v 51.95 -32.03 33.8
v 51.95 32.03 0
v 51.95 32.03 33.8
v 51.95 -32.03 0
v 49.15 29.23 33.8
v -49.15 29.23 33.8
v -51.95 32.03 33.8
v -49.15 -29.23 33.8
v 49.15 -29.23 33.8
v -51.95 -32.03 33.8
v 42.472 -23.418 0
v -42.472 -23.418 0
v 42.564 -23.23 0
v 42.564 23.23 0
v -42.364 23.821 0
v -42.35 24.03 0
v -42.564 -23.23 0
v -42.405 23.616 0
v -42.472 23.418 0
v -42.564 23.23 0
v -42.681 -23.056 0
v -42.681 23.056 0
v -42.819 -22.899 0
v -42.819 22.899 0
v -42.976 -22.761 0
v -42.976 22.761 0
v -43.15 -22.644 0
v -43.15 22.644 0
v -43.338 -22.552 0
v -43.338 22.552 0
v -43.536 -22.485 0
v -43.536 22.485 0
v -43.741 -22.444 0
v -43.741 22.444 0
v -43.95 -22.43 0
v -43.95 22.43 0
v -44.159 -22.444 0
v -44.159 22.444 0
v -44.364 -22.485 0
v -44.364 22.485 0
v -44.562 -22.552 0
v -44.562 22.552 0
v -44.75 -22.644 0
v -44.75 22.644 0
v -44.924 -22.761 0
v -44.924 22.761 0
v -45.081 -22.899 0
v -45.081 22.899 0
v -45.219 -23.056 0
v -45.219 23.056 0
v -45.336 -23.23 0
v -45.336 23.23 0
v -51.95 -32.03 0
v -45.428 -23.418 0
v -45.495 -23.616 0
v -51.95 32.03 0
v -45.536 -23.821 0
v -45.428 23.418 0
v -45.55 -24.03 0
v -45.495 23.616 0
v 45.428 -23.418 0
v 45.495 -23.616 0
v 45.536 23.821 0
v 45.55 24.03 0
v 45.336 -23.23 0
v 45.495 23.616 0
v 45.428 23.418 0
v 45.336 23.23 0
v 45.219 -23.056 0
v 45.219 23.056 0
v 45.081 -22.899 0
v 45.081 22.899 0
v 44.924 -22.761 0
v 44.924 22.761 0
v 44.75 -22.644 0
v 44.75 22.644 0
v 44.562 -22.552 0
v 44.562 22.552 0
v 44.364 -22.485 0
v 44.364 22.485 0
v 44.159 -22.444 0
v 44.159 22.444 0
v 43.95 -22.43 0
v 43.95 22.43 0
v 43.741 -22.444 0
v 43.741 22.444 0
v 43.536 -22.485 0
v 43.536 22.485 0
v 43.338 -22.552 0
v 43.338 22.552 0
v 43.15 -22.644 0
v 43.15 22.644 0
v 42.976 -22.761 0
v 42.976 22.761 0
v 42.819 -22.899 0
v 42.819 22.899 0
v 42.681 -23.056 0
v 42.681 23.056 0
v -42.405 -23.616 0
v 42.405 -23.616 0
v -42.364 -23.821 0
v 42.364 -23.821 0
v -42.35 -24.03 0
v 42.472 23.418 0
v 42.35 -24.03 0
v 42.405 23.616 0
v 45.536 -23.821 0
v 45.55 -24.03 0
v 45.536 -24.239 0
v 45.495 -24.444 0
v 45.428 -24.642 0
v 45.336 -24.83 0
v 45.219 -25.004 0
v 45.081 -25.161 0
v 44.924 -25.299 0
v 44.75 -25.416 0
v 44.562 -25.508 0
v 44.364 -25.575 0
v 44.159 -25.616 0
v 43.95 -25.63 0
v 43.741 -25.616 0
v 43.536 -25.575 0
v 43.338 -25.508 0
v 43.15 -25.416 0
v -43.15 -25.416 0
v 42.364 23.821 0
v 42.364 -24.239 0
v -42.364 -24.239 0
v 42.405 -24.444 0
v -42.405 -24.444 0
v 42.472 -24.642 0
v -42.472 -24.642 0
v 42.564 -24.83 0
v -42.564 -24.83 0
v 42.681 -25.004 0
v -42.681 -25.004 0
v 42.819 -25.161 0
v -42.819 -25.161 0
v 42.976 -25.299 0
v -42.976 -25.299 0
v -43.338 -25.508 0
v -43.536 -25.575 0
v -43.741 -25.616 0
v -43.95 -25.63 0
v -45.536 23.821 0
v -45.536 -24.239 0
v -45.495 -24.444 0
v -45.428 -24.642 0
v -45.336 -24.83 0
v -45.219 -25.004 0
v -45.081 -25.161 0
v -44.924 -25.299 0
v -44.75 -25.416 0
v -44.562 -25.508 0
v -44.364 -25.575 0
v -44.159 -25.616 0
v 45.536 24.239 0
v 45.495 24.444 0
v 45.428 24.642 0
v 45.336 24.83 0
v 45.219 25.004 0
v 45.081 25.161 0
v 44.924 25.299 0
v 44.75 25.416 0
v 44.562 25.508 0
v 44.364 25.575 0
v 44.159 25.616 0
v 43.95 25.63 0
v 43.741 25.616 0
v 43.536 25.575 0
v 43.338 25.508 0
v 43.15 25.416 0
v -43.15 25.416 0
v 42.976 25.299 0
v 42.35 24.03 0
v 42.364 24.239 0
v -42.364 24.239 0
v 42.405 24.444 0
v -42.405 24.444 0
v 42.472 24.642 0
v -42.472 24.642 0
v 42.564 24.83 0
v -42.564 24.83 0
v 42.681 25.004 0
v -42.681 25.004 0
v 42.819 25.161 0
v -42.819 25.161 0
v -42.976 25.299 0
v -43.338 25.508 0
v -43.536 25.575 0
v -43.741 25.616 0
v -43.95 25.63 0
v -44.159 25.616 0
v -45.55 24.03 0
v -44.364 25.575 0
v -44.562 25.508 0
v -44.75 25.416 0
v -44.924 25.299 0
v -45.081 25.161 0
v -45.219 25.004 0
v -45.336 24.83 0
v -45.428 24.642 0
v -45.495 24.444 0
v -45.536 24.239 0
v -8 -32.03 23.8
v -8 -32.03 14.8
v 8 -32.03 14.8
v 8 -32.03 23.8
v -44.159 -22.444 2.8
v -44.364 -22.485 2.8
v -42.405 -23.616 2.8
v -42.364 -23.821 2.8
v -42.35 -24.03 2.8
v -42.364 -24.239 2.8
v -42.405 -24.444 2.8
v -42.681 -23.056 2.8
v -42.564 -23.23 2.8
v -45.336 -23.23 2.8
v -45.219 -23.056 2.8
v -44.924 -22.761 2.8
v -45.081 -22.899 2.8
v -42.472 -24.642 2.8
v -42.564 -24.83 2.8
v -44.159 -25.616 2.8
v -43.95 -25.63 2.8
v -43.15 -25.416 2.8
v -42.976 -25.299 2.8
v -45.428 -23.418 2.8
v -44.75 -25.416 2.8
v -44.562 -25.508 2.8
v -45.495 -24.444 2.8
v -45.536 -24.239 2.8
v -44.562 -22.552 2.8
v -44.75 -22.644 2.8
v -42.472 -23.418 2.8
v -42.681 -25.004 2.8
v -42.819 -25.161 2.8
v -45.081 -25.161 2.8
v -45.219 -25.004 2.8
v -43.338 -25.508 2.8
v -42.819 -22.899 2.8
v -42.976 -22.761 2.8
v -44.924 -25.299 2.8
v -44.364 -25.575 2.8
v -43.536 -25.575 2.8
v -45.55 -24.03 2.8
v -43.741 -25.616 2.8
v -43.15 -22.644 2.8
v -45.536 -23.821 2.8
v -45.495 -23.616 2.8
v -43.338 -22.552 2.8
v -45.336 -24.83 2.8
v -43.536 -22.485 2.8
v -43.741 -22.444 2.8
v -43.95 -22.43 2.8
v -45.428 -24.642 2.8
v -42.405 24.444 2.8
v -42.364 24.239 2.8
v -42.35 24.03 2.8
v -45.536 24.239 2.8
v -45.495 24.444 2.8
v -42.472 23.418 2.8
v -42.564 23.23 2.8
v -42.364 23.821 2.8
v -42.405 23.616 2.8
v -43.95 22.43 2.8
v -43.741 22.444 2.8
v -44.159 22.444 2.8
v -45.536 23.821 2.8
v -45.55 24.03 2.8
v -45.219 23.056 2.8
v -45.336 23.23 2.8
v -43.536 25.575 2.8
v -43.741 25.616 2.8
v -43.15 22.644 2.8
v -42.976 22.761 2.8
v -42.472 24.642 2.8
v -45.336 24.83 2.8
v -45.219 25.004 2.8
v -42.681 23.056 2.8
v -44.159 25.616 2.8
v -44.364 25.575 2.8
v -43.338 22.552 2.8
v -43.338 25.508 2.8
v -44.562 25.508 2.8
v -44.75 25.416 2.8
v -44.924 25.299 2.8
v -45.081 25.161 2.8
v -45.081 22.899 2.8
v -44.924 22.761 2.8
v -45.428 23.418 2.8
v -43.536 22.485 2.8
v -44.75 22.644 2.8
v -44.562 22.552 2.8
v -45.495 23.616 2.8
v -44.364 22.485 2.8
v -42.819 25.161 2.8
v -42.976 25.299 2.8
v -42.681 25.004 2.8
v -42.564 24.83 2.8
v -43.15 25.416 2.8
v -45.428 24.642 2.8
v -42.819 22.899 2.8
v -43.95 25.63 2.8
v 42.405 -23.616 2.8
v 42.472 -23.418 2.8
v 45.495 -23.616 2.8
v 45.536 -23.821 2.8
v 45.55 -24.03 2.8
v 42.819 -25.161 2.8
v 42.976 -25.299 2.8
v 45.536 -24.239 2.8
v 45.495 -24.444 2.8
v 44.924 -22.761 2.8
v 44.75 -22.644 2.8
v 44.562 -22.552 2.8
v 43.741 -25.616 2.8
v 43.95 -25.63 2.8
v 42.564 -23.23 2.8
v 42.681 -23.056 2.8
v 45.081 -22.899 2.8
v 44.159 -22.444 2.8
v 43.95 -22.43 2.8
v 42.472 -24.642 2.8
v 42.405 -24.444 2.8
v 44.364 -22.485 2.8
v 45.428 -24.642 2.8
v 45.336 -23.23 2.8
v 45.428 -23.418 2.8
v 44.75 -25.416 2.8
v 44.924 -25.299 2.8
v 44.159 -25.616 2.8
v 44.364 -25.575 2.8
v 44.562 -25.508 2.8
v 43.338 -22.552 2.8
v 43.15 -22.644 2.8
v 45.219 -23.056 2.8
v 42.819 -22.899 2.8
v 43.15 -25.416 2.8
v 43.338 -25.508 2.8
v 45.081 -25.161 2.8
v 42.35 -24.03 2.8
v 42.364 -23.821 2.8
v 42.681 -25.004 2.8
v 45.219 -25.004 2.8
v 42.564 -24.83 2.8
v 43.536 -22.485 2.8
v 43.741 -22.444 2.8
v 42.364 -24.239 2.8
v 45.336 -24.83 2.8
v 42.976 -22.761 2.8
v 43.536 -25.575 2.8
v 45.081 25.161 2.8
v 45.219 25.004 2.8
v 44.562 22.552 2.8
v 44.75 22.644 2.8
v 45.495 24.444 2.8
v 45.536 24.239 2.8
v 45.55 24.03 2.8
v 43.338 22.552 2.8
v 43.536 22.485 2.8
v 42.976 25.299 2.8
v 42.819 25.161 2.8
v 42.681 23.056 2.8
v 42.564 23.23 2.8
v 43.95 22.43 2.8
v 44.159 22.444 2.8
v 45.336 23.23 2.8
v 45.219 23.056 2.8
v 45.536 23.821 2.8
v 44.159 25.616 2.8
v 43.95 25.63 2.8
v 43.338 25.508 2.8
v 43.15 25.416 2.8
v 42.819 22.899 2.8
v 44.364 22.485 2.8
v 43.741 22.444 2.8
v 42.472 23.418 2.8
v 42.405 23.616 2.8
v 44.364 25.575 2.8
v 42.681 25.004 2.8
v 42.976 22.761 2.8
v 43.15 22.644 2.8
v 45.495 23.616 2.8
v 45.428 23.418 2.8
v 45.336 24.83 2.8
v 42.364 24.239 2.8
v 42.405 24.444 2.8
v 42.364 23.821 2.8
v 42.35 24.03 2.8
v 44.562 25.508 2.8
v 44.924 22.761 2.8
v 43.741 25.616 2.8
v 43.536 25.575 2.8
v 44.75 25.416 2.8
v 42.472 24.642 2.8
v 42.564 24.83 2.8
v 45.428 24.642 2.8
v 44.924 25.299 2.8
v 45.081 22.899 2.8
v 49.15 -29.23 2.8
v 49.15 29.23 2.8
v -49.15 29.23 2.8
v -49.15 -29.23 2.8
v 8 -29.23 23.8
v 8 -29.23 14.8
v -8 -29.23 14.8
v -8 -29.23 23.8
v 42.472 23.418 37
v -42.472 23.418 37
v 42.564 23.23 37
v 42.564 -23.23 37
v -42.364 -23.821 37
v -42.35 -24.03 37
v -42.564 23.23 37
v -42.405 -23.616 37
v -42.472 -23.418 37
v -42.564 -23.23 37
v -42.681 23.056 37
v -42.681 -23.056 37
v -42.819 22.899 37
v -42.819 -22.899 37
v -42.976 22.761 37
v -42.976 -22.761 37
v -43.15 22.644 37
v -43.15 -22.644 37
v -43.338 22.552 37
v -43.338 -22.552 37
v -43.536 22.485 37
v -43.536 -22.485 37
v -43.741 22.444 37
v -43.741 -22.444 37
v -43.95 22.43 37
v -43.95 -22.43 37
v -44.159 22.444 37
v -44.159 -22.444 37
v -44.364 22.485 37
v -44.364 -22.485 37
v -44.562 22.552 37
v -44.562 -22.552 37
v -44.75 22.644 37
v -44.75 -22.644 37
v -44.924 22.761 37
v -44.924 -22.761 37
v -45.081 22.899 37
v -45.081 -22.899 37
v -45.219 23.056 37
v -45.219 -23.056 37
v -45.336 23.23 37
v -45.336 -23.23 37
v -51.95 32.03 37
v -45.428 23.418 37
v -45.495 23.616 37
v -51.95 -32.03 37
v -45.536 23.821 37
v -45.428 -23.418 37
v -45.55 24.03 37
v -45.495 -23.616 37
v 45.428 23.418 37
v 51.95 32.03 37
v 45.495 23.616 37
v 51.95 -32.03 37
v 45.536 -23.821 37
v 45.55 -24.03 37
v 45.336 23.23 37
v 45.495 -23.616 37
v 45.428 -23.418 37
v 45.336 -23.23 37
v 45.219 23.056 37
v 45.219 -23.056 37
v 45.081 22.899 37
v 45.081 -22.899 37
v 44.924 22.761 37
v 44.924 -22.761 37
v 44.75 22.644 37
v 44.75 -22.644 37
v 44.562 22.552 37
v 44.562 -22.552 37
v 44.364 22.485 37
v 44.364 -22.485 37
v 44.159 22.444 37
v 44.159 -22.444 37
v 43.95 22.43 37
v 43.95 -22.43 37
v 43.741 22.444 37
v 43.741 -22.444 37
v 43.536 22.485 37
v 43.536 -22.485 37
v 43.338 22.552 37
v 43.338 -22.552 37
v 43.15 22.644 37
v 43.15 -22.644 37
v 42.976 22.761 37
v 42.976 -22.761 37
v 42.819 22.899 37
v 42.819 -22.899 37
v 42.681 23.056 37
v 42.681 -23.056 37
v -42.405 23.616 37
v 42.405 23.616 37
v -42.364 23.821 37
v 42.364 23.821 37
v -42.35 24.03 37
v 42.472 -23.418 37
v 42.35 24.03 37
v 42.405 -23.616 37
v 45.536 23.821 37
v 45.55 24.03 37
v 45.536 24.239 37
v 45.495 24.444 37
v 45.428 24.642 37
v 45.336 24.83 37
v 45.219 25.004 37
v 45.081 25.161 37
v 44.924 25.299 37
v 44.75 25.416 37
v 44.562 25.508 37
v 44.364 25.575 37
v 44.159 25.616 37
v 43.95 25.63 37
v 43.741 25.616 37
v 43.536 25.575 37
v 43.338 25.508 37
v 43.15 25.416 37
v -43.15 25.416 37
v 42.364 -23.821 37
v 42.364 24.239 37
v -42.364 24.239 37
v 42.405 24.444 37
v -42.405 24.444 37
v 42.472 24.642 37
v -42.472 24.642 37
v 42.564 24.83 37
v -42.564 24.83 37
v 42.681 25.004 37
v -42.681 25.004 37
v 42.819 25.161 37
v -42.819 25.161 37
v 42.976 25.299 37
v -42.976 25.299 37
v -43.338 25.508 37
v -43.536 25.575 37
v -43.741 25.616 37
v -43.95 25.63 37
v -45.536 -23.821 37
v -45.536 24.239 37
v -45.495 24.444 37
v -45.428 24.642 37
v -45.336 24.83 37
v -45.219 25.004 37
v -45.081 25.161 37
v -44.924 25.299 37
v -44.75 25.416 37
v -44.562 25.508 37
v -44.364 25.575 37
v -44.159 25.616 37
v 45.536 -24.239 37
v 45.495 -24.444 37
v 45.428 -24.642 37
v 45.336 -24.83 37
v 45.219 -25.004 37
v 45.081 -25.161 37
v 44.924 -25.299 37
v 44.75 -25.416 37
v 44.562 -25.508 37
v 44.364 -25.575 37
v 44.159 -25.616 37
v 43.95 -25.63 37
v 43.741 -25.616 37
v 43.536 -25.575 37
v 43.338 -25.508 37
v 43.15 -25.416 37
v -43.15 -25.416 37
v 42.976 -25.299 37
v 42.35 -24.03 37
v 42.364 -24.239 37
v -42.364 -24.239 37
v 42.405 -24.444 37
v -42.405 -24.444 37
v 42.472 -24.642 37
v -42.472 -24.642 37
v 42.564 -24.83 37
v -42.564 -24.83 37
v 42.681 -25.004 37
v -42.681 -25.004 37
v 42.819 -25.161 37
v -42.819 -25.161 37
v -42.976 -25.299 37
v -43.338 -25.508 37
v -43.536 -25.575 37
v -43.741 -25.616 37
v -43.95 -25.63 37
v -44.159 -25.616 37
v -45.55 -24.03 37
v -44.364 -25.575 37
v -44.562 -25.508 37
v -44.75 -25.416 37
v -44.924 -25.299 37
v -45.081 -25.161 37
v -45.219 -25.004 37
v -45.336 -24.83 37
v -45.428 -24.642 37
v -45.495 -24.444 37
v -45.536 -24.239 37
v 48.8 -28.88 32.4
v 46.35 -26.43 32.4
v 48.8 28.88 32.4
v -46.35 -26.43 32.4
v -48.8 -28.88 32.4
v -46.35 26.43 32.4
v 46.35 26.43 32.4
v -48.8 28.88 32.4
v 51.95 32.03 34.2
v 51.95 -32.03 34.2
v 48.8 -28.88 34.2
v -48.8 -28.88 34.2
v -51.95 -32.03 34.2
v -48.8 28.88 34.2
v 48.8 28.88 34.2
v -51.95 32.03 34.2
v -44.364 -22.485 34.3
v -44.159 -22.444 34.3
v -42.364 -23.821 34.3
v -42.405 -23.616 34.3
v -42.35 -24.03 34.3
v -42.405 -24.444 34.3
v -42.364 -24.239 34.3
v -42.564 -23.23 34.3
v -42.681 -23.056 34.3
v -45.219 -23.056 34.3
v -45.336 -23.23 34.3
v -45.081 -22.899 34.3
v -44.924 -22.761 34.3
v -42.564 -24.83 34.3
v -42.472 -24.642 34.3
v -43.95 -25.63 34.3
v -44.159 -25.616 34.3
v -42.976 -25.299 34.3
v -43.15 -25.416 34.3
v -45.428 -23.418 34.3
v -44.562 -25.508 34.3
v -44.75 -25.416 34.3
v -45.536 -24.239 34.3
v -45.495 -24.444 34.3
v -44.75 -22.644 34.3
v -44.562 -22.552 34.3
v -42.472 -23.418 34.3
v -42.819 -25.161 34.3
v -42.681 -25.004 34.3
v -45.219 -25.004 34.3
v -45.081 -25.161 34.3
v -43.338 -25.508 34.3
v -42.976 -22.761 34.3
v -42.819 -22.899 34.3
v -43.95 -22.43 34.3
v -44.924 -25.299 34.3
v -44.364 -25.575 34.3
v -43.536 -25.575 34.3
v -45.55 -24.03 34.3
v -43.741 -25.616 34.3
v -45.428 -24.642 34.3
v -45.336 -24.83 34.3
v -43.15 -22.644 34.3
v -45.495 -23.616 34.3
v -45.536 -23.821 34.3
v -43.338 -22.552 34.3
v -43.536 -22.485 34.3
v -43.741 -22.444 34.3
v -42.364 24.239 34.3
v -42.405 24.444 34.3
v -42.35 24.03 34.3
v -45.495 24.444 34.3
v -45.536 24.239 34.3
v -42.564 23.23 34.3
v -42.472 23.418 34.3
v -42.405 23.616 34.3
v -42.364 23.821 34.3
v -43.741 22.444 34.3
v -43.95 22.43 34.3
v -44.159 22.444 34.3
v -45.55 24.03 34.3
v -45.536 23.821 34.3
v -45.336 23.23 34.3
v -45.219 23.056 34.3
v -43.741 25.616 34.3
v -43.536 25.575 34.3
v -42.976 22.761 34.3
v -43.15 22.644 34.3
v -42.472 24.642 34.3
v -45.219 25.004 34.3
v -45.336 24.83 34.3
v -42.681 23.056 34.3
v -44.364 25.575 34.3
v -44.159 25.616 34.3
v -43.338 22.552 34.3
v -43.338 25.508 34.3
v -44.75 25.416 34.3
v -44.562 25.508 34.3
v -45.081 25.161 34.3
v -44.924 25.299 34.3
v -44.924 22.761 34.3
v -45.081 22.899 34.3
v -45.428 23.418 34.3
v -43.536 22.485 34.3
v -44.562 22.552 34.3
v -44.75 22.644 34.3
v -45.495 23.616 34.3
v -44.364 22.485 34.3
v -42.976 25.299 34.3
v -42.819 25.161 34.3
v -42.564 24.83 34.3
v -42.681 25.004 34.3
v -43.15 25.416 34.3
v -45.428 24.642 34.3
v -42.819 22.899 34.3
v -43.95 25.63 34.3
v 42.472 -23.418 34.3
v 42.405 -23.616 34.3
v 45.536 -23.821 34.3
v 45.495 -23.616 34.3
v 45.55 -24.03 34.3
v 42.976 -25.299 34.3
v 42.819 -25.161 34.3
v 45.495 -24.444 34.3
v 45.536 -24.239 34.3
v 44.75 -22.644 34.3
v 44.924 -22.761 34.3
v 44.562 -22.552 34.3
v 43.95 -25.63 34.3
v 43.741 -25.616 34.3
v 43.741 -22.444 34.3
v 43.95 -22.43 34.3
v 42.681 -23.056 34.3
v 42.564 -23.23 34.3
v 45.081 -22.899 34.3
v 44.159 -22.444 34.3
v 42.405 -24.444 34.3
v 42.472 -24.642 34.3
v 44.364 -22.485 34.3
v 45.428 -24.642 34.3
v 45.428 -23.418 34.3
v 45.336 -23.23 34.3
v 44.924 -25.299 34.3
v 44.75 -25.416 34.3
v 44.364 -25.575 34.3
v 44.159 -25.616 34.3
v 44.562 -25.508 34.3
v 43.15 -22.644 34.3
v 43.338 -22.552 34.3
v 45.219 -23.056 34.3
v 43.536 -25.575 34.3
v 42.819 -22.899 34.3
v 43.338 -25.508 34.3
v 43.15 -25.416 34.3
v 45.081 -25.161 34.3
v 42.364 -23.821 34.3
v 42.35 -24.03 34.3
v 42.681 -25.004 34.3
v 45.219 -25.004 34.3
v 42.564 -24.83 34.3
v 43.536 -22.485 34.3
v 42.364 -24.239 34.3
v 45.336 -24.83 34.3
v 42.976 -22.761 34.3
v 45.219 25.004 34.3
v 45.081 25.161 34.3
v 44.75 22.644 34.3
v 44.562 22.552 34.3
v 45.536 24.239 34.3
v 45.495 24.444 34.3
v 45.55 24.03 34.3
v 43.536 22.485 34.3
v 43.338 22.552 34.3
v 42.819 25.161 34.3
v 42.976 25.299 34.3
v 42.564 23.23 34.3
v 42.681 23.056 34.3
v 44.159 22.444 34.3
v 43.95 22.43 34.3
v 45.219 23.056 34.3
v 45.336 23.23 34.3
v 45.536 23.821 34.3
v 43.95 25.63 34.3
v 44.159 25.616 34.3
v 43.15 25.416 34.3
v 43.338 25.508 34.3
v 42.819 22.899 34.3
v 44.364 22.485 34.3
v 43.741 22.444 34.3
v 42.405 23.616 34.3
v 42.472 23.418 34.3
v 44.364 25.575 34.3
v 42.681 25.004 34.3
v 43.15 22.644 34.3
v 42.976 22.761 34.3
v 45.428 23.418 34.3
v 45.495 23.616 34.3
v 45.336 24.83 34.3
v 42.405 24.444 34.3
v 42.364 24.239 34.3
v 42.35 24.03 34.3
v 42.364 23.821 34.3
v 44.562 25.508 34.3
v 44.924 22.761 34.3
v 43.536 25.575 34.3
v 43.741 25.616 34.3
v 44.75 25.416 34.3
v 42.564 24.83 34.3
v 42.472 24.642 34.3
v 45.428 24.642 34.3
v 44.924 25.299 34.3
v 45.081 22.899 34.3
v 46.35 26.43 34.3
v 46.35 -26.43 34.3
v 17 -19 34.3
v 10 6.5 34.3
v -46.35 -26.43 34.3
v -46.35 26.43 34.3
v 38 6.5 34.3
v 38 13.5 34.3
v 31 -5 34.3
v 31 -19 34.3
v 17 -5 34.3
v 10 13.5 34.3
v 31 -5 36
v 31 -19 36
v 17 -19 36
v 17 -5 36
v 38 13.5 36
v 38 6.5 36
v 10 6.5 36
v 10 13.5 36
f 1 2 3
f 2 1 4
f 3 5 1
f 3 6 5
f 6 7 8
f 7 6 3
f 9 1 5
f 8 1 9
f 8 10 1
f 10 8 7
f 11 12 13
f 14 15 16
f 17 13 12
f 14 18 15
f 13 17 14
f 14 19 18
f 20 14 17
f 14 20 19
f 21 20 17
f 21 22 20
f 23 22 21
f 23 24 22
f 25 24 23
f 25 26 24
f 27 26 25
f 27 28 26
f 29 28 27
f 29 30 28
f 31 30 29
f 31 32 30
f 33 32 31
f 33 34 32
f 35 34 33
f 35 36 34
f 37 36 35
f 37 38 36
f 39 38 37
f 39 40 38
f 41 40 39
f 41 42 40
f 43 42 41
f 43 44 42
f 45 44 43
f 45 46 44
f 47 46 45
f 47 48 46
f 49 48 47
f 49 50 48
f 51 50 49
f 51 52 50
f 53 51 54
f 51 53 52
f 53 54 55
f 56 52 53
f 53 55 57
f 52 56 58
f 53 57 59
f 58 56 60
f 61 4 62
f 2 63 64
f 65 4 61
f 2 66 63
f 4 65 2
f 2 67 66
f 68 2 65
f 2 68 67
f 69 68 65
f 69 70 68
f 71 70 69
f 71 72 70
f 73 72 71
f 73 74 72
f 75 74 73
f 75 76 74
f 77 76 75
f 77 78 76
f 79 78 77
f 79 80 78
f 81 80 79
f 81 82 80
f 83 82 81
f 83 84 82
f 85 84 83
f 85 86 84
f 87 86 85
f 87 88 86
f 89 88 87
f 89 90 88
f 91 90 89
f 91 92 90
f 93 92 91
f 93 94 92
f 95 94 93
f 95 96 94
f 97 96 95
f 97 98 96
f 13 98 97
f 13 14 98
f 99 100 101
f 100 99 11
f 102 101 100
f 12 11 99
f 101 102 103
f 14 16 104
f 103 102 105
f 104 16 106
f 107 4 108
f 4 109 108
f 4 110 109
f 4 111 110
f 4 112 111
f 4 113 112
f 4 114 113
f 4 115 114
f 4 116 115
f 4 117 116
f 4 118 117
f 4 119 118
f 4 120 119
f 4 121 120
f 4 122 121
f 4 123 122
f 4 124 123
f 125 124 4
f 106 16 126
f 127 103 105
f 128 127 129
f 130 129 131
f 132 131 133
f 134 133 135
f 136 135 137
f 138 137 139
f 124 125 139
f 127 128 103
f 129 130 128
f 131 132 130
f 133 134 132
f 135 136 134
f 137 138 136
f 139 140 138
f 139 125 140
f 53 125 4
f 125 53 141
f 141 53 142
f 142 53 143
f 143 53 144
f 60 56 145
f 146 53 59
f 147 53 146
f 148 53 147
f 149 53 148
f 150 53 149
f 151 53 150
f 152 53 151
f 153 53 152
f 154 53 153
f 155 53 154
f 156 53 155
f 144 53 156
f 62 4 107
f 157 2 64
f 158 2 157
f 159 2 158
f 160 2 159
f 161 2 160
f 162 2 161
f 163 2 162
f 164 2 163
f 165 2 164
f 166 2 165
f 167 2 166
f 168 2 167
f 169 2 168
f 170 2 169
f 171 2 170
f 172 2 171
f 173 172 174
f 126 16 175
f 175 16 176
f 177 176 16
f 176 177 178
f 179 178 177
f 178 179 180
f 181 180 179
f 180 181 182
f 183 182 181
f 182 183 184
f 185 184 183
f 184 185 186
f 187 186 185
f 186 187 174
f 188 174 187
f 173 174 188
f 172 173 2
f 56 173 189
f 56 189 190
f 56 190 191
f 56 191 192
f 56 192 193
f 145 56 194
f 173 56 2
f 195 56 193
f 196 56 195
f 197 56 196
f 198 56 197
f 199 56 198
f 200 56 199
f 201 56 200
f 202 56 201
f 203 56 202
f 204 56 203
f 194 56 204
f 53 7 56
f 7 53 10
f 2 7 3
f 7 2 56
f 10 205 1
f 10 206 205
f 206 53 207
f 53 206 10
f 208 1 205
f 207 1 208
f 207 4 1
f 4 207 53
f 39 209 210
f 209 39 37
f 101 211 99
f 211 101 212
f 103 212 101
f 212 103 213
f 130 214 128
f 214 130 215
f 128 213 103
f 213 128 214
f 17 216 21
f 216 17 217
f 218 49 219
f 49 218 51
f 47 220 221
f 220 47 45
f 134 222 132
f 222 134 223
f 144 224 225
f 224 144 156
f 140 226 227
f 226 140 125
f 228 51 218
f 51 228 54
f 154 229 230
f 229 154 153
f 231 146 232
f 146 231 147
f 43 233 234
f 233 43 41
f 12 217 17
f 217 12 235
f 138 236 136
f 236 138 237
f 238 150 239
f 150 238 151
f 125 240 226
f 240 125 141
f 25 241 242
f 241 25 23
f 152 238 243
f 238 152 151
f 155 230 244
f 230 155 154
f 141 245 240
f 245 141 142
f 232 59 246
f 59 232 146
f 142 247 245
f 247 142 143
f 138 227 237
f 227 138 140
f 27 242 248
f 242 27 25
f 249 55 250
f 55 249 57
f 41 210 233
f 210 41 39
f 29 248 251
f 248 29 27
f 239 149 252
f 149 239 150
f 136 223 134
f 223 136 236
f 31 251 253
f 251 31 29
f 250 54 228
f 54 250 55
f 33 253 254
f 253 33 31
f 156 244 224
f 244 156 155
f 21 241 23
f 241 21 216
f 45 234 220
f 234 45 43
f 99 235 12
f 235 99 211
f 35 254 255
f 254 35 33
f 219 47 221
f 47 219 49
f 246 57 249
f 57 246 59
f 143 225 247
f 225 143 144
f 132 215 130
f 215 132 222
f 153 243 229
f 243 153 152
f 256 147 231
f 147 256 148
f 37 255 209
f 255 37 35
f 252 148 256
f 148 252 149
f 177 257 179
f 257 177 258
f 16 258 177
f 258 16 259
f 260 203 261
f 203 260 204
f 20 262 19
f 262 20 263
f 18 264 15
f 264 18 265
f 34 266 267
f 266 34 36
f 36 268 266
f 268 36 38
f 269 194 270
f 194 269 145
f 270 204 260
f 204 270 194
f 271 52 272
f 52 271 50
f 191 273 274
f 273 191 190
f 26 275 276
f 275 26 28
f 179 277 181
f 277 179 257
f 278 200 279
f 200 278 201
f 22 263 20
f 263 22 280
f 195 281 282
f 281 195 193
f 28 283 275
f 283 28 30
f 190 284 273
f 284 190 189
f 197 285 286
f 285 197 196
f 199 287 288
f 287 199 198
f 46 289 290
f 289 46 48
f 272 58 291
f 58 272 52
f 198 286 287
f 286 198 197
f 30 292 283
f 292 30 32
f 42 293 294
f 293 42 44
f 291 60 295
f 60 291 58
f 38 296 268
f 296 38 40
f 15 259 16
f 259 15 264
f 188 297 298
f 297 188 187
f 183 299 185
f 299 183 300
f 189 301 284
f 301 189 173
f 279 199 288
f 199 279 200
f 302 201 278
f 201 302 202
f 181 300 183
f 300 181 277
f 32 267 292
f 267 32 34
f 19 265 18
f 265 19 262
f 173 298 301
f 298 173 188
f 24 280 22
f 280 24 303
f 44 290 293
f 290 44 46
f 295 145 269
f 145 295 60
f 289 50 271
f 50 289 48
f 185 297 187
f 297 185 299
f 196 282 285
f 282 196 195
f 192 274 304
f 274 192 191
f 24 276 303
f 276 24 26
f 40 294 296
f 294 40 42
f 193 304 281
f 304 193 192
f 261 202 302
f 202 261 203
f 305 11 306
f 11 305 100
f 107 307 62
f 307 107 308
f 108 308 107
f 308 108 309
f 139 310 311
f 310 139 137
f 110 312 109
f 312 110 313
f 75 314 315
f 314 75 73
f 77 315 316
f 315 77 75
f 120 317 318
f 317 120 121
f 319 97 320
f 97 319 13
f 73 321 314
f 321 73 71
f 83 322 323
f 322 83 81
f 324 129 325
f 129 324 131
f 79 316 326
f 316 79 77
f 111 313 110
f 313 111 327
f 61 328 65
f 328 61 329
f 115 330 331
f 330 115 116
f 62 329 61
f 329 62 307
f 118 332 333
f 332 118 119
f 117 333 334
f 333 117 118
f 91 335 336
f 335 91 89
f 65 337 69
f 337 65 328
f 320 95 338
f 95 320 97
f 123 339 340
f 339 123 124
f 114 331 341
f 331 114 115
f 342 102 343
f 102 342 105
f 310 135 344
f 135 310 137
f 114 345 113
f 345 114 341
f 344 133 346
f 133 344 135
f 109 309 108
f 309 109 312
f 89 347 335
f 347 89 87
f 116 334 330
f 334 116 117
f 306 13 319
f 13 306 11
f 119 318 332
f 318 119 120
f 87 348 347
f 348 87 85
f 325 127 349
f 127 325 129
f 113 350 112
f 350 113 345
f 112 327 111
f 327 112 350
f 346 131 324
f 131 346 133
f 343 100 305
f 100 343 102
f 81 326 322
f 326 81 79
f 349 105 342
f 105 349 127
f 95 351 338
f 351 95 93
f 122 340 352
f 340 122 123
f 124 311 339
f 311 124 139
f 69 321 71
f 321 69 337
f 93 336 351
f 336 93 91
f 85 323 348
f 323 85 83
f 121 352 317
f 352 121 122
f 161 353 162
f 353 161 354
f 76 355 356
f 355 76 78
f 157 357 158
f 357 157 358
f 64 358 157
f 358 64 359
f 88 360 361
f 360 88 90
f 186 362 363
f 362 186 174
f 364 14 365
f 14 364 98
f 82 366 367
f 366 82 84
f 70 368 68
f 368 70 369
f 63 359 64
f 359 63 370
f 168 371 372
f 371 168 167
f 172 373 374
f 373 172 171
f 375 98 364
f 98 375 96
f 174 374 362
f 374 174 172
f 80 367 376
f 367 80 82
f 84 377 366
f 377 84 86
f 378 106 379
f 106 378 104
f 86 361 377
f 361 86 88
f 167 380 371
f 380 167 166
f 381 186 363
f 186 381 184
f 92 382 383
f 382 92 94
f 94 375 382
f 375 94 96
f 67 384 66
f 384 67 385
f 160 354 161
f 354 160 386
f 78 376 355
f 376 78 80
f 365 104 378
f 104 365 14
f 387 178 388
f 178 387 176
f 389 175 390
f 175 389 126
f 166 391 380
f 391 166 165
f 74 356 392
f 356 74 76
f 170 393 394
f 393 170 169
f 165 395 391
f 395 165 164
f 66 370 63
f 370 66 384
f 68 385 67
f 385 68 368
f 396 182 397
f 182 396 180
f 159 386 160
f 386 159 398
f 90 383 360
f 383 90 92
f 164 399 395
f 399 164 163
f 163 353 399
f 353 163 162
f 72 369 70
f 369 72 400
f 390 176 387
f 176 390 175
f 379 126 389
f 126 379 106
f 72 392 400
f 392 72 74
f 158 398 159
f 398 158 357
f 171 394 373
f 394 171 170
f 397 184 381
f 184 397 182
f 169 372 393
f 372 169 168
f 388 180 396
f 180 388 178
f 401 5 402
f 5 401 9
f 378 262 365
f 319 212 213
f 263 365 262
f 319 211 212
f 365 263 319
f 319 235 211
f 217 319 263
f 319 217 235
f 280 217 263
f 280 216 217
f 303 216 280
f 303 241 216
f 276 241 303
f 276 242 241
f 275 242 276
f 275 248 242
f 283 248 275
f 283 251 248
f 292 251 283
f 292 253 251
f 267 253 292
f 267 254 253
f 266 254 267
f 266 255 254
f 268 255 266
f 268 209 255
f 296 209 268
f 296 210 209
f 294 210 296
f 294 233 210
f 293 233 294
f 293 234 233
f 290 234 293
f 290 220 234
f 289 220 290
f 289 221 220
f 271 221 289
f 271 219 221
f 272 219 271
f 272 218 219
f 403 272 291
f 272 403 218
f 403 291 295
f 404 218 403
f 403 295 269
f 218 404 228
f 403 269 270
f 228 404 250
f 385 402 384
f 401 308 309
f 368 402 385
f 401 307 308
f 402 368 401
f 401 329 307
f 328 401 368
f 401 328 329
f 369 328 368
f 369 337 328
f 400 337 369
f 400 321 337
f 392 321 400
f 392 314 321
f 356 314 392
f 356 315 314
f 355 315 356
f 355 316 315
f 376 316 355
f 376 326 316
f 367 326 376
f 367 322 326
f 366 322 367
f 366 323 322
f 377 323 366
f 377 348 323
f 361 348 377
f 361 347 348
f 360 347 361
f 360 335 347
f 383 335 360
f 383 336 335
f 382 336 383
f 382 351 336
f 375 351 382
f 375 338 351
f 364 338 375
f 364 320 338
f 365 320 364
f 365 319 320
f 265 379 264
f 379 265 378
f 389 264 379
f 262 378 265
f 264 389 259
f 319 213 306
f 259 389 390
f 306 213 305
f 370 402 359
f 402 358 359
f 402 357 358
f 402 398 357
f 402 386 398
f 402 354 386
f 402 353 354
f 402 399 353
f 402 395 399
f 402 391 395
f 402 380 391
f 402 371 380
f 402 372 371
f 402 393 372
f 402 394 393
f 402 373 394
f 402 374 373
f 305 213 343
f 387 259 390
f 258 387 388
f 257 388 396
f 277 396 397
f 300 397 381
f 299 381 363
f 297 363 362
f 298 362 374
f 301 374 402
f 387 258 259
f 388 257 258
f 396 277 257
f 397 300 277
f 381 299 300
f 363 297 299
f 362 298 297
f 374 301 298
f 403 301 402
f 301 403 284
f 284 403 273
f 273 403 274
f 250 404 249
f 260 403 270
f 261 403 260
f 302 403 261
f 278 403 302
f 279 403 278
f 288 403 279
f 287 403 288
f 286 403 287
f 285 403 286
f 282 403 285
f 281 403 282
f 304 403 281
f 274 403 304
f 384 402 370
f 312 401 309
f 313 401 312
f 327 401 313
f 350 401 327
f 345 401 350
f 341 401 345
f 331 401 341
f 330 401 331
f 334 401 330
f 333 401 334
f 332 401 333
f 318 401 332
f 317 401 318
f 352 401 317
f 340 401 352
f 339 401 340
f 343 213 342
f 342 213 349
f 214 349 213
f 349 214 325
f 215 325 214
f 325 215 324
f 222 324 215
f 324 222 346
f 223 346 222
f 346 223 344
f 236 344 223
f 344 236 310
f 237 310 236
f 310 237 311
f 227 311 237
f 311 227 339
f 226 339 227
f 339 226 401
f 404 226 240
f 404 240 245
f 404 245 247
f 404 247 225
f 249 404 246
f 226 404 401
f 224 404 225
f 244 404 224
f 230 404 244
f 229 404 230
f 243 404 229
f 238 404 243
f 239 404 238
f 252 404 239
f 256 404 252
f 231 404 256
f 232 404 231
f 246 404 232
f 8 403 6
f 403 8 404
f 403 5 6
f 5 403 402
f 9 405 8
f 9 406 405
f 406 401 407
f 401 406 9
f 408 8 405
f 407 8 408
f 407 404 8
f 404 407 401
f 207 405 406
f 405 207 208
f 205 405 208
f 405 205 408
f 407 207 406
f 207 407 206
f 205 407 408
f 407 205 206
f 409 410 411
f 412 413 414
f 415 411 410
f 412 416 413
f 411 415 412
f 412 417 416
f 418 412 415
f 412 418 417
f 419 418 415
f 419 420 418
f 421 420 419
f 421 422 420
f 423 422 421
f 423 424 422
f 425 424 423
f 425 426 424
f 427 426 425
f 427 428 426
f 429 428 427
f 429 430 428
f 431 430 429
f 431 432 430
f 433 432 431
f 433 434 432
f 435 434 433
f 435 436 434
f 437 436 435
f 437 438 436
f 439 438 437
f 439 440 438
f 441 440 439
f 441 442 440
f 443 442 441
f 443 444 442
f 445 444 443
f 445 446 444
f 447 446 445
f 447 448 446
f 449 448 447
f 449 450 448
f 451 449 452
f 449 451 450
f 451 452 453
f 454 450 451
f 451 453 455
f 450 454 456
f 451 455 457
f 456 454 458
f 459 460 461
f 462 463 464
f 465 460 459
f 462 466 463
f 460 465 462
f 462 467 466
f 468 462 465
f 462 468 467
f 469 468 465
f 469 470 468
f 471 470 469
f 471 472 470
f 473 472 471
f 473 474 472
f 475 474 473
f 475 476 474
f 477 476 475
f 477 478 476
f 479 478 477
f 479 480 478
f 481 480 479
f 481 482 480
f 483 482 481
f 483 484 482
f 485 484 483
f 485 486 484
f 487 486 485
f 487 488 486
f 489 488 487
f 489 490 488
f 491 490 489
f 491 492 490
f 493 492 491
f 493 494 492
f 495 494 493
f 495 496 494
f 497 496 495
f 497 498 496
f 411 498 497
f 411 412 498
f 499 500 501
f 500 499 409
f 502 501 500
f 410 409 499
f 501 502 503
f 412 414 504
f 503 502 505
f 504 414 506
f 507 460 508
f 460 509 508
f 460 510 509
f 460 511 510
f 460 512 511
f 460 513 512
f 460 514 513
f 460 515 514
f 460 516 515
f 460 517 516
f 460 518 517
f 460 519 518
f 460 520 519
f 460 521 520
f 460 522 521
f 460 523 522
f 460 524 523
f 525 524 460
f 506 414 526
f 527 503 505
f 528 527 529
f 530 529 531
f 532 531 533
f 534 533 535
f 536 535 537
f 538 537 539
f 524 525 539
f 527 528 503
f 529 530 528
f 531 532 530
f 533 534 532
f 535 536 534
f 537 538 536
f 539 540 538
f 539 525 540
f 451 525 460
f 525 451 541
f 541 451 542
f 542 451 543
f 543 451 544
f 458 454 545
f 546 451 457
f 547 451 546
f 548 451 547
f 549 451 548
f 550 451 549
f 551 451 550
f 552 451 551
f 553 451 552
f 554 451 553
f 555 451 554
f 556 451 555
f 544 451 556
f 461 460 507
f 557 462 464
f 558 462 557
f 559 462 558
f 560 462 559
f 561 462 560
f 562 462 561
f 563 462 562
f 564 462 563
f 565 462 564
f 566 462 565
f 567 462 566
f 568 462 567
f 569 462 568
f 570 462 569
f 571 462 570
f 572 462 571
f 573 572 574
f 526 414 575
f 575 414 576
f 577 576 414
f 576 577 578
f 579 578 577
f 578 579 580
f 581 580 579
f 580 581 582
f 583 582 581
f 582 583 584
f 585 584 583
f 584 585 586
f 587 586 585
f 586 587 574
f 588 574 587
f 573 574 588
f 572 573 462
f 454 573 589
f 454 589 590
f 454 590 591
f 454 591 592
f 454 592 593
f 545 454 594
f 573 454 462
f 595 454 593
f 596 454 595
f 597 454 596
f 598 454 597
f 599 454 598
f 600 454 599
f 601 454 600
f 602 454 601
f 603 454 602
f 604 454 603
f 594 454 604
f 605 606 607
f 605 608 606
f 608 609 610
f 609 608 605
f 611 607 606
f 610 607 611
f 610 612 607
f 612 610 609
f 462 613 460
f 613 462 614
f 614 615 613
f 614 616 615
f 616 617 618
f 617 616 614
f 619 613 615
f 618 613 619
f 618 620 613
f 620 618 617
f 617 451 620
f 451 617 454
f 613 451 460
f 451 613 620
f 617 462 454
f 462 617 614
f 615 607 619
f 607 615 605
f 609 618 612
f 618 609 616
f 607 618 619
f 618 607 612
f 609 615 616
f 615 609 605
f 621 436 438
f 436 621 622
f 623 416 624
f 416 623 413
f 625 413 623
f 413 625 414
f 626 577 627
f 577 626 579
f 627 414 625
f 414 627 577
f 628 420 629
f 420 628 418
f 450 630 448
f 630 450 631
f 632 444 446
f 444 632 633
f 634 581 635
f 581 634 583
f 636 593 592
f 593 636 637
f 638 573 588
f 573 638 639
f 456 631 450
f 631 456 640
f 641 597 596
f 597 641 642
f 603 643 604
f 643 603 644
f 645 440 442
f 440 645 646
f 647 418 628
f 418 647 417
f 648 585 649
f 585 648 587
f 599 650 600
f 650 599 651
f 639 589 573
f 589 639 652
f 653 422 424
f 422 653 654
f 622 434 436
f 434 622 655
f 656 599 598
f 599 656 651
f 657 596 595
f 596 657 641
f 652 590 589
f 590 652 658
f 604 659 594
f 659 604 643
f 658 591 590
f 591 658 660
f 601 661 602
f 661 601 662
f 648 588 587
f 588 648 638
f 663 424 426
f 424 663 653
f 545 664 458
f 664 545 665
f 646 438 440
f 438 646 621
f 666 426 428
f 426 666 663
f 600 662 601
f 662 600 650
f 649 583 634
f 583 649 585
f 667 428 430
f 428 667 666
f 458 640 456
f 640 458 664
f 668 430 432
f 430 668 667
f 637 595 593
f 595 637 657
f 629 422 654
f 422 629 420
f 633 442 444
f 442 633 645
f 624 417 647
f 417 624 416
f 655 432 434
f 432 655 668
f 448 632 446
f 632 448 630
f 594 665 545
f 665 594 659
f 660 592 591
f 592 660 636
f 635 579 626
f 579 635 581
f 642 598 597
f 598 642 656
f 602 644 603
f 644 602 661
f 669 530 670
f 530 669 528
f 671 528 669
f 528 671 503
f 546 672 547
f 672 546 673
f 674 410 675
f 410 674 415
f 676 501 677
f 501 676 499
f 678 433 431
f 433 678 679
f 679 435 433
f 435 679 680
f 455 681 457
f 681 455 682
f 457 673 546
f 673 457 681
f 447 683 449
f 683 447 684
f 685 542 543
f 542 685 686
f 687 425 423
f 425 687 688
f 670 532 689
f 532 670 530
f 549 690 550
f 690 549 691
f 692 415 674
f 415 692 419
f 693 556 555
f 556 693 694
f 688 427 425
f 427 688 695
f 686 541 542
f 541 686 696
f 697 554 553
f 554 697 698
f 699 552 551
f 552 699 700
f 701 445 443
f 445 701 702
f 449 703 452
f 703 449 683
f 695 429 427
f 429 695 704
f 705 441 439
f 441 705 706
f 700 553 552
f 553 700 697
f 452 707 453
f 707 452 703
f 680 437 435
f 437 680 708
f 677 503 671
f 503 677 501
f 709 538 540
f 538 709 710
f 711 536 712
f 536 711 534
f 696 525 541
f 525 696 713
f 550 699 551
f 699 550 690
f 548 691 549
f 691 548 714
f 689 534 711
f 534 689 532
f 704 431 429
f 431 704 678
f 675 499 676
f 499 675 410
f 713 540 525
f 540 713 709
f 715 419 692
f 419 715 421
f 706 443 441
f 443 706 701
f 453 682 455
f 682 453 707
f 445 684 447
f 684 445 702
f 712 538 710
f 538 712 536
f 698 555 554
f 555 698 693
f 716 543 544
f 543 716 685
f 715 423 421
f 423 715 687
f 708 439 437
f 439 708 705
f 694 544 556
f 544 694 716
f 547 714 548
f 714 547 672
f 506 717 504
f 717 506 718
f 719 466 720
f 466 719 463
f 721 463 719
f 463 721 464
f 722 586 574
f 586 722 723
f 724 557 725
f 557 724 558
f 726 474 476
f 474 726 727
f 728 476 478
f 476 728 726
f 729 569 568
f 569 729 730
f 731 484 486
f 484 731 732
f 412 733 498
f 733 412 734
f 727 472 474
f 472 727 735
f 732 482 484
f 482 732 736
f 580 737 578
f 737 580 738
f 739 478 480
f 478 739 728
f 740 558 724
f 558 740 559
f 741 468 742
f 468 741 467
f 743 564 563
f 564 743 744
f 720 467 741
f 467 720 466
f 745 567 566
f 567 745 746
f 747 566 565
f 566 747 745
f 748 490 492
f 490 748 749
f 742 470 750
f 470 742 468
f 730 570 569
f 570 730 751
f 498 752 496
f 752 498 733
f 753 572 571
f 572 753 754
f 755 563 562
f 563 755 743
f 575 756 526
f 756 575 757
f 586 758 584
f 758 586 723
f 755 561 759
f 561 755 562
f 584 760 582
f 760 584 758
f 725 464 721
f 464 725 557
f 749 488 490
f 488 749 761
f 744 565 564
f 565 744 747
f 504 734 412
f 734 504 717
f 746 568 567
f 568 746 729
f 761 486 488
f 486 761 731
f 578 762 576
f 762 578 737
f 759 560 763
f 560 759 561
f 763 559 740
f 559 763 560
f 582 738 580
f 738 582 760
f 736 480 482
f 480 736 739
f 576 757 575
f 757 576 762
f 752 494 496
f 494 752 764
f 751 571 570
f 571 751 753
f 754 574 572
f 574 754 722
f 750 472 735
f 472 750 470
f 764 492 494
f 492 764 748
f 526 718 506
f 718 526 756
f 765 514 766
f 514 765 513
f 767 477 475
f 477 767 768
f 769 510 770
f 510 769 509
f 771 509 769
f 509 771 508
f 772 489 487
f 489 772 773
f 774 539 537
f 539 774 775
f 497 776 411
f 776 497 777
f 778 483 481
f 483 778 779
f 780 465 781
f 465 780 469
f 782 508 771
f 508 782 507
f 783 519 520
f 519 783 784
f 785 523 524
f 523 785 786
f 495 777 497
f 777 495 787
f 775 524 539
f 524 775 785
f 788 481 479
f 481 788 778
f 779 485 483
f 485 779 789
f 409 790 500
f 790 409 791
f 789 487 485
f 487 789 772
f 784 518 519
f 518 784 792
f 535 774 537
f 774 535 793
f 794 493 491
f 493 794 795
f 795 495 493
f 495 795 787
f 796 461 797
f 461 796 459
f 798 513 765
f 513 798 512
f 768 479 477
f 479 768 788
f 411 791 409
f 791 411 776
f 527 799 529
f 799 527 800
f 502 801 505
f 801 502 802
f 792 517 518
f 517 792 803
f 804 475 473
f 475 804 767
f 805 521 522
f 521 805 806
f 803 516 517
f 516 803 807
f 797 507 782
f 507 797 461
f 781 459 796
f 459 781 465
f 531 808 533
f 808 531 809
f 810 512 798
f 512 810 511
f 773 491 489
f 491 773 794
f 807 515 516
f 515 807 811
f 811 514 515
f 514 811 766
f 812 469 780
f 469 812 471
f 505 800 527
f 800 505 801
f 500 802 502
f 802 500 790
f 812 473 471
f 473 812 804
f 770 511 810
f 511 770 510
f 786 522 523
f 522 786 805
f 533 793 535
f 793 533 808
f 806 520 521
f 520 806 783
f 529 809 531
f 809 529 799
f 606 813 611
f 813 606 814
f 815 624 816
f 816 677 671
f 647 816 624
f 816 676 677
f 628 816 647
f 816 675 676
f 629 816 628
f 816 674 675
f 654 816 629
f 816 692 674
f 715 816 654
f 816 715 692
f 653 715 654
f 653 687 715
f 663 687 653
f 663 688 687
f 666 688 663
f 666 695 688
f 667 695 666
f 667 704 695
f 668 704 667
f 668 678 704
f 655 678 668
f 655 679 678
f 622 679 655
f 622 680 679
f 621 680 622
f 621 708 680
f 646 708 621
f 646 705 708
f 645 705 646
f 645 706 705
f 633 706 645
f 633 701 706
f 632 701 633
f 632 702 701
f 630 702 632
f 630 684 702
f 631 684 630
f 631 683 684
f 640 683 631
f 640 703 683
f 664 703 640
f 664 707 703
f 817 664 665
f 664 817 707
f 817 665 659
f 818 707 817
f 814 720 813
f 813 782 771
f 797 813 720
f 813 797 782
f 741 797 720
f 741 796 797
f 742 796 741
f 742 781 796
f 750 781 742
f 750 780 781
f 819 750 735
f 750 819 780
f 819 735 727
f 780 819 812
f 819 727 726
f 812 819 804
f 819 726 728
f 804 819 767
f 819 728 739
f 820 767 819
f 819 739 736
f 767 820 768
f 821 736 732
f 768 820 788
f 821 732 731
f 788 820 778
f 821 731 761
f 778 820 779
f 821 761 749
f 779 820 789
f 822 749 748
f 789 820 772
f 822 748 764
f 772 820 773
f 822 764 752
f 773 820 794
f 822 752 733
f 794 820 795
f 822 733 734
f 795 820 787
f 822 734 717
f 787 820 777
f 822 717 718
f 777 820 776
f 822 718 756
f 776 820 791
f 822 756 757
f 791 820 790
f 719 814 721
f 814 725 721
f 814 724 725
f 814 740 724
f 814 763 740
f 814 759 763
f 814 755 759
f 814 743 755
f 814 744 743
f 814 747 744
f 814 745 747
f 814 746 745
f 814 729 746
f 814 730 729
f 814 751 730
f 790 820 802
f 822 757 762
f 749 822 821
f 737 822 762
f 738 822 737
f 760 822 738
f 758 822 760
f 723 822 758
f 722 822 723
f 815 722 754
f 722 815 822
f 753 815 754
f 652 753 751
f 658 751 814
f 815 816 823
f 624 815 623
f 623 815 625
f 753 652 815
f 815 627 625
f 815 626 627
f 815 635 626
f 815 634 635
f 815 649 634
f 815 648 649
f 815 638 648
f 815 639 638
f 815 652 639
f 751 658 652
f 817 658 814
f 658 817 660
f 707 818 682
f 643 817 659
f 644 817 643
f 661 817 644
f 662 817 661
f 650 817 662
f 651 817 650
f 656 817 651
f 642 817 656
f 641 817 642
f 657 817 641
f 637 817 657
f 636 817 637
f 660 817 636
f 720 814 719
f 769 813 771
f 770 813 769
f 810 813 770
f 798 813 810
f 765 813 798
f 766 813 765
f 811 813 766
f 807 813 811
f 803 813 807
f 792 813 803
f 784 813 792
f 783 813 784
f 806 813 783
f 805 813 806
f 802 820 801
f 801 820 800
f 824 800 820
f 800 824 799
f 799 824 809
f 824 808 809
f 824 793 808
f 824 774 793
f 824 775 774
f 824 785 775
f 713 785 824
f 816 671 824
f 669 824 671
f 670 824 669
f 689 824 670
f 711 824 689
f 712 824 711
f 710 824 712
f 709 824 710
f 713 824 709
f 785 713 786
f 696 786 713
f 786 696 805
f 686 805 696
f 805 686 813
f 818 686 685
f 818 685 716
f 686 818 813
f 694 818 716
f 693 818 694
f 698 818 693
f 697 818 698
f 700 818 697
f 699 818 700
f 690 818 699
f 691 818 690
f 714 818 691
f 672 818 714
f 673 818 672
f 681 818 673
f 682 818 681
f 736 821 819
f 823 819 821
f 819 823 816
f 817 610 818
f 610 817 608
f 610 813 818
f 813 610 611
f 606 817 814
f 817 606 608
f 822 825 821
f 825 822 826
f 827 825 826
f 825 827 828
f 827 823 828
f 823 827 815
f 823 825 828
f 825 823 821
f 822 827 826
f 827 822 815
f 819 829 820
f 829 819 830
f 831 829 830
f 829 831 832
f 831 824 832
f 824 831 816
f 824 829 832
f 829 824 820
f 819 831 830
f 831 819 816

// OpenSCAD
// Vacuum battery enclosure V1 - test fit only
// Reference: cad/step02_battery_assembly.step / .stl
// Coordinate convention: X=length, Y=width, Z=height. Split at mid-height.

part = "assembly"; // "bottom", "top", or "assembly"
$fn = 48;

battery = [96.7, 56.86, 55.2];
clearance = 0.8;              // target internal clearance per side
wall = 2.8;                   // FDM wall thickness target
floor = 2.8;
lid_thickness = 2.8;
lip = 1.8;
split_z = 31.0;               // lower internal depth; battery drops into lower half
screw_d = 3.2;                // M3 clearance
post_od = 7.5;
post_inset = 8;
usb_cutout = [16, wall + 0.8, 9];
button_cutout = [14, 14, lid_thickness + 1];
led_cutout = [28, 7, lid_thickness + 1];

inner = [battery[0] + 2*clearance, battery[1] + 2*clearance, battery[2] + 2*clearance];
outer = [inner[0] + 2*wall, inner[1] + 2*wall, inner[2] + floor + lid_thickness];

module screw_locations() {
  for (x=[-outer[0]/2+post_inset, outer[0]/2-post_inset])
    for (y=[-outer[1]/2+post_inset, outer[1]/2-post_inset])
      translate([x,y,0]) children();
}

module bottom() {
  difference() {
    union() {
      translate([-outer[0]/2,-outer[1]/2,0]) cube([outer[0], outer[1], split_z + floor]);
      screw_locations() translate([0,0,floor]) cylinder(d=post_od, h=split_z-1);
    }
    translate([-inner[0]/2,-inner[1]/2,floor]) cube([inner[0], inner[1], split_z + 2]);
    // USB-C access on front/negative Y wall
    translate([-usb_cutout[0]/2, -outer[1]/2-0.1, floor+12]) cube(usb_cutout);
    screw_locations() translate([0,0,-0.5]) cylinder(d=screw_d, h=split_z+floor+1);
  }
}

module top() {
  top_h = inner[2] - split_z + lid_thickness + lip;
  difference() {
    union() {
      // lid cap
      translate([-outer[0]/2,-outer[1]/2,split_z+floor]) cube([outer[0], outer[1], lid_thickness]);
      // shallow alignment lip that nests inside bottom opening
      translate([-inner[0]/2+0.35,-inner[1]/2+0.35,split_z+floor-lip])
        cube([inner[0]-0.7, inner[1]-0.7, lip]);
      screw_locations() translate([0,0,split_z+floor-lip]) cylinder(d=post_od, h=lid_thickness+lip);
    }
    // open underside so the battery upper features have clearance
    translate([-inner[0]/2+wall,-inner[1]/2+wall,split_z+floor-lip-0.1])
      cube([inner[0]-2*wall, inner[1]-2*wall, lip+0.2]);
    // power button opening, placed on top near +X end from reference model
    translate([24, -12, split_z+floor-0.1]) cube(button_cutout, center=true);
    // LED window opening next to button
    translate([24, 10, split_z+floor-0.1]) cube(led_cutout, center=true);
    screw_locations() translate([0,0,split_z+floor-lip-0.5]) cylinder(d=screw_d, h=lid_thickness+lip+1);
  }
}

if (part == "bottom") bottom();
else if (part == "top") top();
else {
  bottom();
  translate([0,0,0.4]) top();
}
